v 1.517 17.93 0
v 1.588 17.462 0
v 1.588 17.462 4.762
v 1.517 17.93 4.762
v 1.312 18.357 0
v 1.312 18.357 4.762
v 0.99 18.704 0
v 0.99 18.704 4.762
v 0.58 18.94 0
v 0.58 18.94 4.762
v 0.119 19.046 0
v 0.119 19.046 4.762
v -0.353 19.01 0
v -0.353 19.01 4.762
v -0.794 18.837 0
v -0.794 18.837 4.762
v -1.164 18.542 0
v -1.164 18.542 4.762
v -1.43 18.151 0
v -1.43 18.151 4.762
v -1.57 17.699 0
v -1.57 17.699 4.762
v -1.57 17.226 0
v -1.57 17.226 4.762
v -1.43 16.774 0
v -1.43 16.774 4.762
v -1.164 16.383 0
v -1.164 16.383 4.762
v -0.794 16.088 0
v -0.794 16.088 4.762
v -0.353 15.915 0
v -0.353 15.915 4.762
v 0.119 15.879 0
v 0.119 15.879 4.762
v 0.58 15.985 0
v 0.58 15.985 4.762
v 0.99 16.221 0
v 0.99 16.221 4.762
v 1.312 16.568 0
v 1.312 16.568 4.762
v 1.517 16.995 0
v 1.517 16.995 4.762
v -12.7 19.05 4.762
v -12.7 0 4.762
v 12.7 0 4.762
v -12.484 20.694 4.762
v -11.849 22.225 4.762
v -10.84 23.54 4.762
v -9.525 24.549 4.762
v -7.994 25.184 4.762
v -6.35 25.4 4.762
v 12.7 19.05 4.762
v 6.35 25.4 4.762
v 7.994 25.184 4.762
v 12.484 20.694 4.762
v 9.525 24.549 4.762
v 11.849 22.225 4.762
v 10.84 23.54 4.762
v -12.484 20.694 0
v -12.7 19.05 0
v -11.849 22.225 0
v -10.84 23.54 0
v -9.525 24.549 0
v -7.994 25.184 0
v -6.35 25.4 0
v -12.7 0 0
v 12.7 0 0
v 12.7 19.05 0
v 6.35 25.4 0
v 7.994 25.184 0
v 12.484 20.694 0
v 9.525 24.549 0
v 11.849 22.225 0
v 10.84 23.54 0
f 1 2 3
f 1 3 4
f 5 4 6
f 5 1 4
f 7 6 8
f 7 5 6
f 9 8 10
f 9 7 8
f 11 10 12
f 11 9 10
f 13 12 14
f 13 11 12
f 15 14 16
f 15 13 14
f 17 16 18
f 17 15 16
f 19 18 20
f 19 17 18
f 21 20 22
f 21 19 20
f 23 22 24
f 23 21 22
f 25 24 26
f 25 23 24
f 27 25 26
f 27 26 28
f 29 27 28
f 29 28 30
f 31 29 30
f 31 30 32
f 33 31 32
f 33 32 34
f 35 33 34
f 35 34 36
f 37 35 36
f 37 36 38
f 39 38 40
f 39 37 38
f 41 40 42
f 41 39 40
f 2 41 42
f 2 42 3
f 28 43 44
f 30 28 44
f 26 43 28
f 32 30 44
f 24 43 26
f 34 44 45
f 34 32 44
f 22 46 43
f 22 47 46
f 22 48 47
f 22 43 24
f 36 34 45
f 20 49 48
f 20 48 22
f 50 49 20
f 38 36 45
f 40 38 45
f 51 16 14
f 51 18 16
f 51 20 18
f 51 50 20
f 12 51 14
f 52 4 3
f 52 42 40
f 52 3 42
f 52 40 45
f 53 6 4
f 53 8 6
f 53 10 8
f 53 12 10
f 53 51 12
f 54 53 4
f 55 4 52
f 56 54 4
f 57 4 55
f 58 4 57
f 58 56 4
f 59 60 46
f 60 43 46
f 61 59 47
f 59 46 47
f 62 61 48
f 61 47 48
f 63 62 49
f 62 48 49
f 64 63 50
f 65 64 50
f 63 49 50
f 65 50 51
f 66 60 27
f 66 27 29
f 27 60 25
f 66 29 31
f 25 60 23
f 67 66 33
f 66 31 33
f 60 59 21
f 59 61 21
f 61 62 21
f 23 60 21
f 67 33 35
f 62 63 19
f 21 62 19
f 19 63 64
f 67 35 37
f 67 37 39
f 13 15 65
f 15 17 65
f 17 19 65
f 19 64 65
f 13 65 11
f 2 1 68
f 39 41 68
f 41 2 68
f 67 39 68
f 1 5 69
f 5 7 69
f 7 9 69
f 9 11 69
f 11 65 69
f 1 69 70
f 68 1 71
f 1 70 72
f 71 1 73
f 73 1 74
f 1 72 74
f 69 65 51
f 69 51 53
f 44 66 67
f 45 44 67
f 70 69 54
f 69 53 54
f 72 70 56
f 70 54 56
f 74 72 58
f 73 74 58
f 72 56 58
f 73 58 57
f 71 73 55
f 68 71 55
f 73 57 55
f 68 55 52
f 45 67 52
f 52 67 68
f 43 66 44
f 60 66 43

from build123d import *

# Parameters (mm, degrees)
F0_W     = 25.4
F0_H     = 25.4
F0_R     = 1.5875
F1_DEPTH = 4.7625
F2_R     = 6.35


with BuildPart() as f1:
    # F0 (on Top) → F1 (new body)
    with BuildSketch(Plane.XY):
        with Locations((0, 12.7)):
            Rectangle(F0_W, F0_H)
        with Locations((0, 17.4625)):
            Circle(F0_R, mode=Mode.SUBTRACT)
    extrude(amount=F1_DEPTH)

    # F2
    f2_edges = [f1.edges().sort_by_distance(p)[0] for p in [
        (-12.7, 25.4, 2.38125),
        (12.7, 25.4, 2.38125),
    ]]
    fillet(f2_edges, radius=F2_R)


solid = f1.part
